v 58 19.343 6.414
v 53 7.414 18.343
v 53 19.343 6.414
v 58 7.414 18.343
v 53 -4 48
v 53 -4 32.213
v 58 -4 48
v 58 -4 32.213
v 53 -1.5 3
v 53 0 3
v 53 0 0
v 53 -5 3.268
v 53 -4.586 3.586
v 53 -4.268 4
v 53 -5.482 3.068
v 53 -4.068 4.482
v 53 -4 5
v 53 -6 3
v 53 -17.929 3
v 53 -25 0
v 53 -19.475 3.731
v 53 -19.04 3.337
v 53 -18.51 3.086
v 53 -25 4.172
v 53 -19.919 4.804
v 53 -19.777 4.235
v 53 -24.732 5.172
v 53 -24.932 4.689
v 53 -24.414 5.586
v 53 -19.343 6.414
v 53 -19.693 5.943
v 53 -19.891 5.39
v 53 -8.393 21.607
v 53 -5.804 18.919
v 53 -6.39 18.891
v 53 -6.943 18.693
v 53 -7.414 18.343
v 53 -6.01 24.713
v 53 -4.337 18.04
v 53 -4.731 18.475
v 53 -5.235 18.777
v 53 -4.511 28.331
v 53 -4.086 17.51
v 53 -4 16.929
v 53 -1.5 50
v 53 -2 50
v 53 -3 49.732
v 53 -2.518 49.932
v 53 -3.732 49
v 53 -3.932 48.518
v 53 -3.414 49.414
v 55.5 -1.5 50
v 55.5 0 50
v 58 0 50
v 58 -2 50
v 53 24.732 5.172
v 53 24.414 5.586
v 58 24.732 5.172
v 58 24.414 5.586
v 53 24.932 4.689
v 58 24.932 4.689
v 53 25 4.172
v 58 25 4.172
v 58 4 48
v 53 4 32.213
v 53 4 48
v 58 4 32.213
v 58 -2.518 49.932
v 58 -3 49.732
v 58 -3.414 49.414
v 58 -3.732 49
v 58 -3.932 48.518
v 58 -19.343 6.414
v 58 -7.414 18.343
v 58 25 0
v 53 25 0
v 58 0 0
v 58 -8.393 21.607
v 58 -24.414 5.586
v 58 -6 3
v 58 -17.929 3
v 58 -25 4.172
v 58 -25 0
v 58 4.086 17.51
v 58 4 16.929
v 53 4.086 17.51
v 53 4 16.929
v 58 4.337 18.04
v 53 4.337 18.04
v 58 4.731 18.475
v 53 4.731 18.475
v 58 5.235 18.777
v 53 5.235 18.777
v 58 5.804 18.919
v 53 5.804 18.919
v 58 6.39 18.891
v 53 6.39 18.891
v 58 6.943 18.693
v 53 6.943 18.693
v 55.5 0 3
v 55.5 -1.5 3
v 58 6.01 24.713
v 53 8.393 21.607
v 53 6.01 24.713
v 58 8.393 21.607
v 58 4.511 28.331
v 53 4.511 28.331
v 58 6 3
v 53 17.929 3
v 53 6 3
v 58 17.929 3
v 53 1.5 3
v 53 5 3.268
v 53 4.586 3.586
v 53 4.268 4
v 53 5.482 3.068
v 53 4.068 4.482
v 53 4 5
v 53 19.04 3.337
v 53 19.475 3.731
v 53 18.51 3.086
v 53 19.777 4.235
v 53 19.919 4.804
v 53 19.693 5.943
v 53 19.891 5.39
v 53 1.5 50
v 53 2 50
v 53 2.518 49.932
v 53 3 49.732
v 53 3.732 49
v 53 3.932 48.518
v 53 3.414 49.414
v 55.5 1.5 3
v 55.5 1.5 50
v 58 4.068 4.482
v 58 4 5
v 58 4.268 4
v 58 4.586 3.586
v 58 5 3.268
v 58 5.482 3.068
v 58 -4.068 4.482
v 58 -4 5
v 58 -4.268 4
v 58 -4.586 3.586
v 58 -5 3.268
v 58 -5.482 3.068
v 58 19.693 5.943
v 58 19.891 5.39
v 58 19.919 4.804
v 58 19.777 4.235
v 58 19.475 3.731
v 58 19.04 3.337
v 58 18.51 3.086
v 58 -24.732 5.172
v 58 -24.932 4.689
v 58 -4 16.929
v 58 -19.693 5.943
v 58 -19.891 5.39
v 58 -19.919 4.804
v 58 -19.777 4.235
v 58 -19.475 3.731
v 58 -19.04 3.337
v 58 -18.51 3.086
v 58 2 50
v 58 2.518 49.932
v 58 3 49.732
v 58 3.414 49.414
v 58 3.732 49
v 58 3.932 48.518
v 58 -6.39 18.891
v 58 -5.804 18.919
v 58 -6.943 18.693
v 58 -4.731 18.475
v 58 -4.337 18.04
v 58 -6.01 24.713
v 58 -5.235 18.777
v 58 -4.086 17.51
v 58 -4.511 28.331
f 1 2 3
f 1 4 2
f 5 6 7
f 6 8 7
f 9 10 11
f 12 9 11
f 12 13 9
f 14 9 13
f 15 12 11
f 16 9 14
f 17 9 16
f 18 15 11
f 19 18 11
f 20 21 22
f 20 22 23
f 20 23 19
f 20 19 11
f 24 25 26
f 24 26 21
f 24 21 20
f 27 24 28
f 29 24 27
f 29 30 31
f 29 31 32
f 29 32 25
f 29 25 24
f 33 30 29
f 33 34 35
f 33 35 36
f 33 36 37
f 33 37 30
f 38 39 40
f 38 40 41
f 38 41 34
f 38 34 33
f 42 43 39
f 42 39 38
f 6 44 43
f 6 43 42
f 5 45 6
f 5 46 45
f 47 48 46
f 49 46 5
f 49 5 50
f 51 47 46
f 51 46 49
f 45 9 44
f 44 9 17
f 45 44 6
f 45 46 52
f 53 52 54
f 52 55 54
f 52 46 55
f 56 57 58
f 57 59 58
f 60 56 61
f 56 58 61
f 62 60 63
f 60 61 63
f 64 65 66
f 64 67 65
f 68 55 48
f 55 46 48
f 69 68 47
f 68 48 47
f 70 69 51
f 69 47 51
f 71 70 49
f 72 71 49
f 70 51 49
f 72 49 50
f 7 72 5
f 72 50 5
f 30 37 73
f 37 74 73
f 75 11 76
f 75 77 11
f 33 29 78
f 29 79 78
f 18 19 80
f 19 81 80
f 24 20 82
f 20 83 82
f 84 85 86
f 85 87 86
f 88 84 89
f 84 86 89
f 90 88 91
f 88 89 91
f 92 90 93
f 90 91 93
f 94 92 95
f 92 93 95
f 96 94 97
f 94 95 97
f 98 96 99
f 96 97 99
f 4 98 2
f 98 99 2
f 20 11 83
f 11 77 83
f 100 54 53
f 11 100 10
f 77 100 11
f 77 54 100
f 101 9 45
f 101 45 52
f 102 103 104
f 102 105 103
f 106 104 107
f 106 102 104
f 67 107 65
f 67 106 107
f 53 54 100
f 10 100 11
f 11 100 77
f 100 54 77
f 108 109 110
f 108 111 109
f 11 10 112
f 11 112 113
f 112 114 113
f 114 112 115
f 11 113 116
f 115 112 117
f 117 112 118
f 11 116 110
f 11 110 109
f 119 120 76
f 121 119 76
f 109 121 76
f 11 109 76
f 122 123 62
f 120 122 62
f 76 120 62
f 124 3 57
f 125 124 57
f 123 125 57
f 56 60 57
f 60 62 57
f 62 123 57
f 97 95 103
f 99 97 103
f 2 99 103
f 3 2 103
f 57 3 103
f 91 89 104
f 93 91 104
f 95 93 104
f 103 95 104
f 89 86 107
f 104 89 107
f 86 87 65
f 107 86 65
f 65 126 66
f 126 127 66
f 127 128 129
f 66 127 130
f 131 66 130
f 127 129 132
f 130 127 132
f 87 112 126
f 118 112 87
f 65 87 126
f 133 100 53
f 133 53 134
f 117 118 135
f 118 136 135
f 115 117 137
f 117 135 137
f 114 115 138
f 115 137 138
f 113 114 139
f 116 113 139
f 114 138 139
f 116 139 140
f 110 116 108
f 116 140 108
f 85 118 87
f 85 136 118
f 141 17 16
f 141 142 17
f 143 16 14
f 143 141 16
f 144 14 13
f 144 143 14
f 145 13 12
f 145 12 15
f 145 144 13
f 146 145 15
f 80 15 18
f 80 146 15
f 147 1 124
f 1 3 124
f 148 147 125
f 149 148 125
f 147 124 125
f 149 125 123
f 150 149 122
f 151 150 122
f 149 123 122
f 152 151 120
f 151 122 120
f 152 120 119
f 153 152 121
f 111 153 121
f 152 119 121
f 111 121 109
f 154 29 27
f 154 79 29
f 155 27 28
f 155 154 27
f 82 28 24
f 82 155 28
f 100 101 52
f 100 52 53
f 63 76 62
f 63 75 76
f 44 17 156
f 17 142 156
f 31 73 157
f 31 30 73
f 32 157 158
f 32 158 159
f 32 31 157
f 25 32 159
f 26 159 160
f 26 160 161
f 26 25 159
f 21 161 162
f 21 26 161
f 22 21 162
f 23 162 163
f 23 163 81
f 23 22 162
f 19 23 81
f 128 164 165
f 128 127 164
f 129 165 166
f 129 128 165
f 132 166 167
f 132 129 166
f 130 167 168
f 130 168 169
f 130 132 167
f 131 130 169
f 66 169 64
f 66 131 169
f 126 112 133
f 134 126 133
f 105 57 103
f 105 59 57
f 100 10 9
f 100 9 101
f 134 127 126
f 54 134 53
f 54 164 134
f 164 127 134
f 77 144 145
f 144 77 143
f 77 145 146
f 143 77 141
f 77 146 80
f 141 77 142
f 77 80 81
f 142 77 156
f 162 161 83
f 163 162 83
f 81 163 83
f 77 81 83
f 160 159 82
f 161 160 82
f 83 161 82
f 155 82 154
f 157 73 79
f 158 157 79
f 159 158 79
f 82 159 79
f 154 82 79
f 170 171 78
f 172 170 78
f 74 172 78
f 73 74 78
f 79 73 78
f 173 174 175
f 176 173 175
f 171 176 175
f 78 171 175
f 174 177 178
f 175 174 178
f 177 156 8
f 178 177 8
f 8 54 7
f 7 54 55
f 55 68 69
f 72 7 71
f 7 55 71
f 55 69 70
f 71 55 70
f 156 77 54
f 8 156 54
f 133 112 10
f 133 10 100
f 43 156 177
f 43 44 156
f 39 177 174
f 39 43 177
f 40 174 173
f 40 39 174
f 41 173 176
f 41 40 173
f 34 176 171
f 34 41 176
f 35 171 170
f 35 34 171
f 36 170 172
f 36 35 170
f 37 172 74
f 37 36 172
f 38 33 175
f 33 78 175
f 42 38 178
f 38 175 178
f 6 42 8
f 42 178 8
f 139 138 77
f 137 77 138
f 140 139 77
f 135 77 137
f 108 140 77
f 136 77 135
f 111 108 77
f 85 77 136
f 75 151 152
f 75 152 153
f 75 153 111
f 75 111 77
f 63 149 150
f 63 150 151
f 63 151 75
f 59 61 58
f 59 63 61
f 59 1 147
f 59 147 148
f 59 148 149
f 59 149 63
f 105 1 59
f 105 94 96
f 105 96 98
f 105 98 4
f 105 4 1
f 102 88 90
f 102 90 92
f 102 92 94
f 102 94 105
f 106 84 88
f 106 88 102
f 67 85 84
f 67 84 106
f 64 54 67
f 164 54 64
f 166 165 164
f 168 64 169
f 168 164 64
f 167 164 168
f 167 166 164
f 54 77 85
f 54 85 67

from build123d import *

# Parameters (mm, degrees)
F2_DEPTH = 2.5
F3_R     = 2
F3_2_R   = 2
F4_R     = 15
F4_2_R   = 15
F6_W     = 2.5
F6_H     = 3
F7_DEPTH = 47.001


# Not quite as in the source:
# - a pattern or mirror of a feature is missing from the dataset's text; its kind, count and spacing are read off the source's solid


with BuildPart() as f2:
    # F1 (on offset) → F2 (new body, symmetric)
    with BuildSketch(Plane.YZ.offset(55.5)):
        Polygon((0, 0), (25, 0), (25, 5), (4, 26), (4, 50), (0, 50), align=None)
        Polygon((4, 3), (4, 21.7573593129), (22.7573593129, 3), align=None, mode=Mode.SUBTRACT)
    extrude(amount=F2_DEPTH, both=True)


with BuildPart() as f2_copies_1:
    # F2_copies: instance of F2
    add(f2.part.mirror(Plane(origin=(0, 0, 0), x_dir=(0, 0, -1), z_dir=(0, -1, 0))))

    # F3#2
    f3_2_edges = [f2_copies_1.edges().sort_by_distance(p)[0] for p in [
        (55.5, -4, 50),
        (55.5, -25, 5),
        (55.5, -4, 21.757359),
        (55.5, -22.757359, 3),
        (55.5, -4, 3),
    ]]
    fillet(f3_2_edges, radius=F3_2_R)

    # F4#2
    f4_2_edges = [f2_copies_1.edges().sort_by_distance(p)[0] for p in [
        (55.5, -4, 26),
    ]]
    fillet(f4_2_edges, radius=F4_2_R)


with BuildPart() as f2_1:
    add(f2.part)

    # F3
    f3_edges = [f2_1.edges().sort_by_distance(p)[0] for p in [
        (55.5, 4, 50),
        (55.5, 25, 5),
        (55.5, 22.757359, 3),
        (55.5, 4, 3),
        (55.5, 4, 21.757359),
    ]]
    fillet(f3_edges, radius=F3_R)

    # F4
    f4_edges = [f2_1.edges().sort_by_distance(p)[0] for p in [
        (55.5, 4, 26),
    ]]
    fillet(f4_edges, radius=F4_R)


with BuildPart() as f7_tool:
    # F6 (on offset) → F7 (new body, through all)
    with BuildSketch(Plane.XY.offset(3)):
        with Locations((54.25, 0)):
            Rectangle(F6_W, F6_H)
    extrude(amount=F7_DEPTH)


with BuildPart() as f2_2:
    add(f2_1.part)

    # F7: cut by f7_tool
    add(f7_tool.part, mode=Mode.SUBTRACT)


with BuildPart() as f2_copies_1_1:
    add(f2_copies_1.part)

    # F7: cut by f7_tool
    add(f7_tool.part, mode=Mode.SUBTRACT)


solid = Compound([f2_2.part, f2_copies_1_1.part])
